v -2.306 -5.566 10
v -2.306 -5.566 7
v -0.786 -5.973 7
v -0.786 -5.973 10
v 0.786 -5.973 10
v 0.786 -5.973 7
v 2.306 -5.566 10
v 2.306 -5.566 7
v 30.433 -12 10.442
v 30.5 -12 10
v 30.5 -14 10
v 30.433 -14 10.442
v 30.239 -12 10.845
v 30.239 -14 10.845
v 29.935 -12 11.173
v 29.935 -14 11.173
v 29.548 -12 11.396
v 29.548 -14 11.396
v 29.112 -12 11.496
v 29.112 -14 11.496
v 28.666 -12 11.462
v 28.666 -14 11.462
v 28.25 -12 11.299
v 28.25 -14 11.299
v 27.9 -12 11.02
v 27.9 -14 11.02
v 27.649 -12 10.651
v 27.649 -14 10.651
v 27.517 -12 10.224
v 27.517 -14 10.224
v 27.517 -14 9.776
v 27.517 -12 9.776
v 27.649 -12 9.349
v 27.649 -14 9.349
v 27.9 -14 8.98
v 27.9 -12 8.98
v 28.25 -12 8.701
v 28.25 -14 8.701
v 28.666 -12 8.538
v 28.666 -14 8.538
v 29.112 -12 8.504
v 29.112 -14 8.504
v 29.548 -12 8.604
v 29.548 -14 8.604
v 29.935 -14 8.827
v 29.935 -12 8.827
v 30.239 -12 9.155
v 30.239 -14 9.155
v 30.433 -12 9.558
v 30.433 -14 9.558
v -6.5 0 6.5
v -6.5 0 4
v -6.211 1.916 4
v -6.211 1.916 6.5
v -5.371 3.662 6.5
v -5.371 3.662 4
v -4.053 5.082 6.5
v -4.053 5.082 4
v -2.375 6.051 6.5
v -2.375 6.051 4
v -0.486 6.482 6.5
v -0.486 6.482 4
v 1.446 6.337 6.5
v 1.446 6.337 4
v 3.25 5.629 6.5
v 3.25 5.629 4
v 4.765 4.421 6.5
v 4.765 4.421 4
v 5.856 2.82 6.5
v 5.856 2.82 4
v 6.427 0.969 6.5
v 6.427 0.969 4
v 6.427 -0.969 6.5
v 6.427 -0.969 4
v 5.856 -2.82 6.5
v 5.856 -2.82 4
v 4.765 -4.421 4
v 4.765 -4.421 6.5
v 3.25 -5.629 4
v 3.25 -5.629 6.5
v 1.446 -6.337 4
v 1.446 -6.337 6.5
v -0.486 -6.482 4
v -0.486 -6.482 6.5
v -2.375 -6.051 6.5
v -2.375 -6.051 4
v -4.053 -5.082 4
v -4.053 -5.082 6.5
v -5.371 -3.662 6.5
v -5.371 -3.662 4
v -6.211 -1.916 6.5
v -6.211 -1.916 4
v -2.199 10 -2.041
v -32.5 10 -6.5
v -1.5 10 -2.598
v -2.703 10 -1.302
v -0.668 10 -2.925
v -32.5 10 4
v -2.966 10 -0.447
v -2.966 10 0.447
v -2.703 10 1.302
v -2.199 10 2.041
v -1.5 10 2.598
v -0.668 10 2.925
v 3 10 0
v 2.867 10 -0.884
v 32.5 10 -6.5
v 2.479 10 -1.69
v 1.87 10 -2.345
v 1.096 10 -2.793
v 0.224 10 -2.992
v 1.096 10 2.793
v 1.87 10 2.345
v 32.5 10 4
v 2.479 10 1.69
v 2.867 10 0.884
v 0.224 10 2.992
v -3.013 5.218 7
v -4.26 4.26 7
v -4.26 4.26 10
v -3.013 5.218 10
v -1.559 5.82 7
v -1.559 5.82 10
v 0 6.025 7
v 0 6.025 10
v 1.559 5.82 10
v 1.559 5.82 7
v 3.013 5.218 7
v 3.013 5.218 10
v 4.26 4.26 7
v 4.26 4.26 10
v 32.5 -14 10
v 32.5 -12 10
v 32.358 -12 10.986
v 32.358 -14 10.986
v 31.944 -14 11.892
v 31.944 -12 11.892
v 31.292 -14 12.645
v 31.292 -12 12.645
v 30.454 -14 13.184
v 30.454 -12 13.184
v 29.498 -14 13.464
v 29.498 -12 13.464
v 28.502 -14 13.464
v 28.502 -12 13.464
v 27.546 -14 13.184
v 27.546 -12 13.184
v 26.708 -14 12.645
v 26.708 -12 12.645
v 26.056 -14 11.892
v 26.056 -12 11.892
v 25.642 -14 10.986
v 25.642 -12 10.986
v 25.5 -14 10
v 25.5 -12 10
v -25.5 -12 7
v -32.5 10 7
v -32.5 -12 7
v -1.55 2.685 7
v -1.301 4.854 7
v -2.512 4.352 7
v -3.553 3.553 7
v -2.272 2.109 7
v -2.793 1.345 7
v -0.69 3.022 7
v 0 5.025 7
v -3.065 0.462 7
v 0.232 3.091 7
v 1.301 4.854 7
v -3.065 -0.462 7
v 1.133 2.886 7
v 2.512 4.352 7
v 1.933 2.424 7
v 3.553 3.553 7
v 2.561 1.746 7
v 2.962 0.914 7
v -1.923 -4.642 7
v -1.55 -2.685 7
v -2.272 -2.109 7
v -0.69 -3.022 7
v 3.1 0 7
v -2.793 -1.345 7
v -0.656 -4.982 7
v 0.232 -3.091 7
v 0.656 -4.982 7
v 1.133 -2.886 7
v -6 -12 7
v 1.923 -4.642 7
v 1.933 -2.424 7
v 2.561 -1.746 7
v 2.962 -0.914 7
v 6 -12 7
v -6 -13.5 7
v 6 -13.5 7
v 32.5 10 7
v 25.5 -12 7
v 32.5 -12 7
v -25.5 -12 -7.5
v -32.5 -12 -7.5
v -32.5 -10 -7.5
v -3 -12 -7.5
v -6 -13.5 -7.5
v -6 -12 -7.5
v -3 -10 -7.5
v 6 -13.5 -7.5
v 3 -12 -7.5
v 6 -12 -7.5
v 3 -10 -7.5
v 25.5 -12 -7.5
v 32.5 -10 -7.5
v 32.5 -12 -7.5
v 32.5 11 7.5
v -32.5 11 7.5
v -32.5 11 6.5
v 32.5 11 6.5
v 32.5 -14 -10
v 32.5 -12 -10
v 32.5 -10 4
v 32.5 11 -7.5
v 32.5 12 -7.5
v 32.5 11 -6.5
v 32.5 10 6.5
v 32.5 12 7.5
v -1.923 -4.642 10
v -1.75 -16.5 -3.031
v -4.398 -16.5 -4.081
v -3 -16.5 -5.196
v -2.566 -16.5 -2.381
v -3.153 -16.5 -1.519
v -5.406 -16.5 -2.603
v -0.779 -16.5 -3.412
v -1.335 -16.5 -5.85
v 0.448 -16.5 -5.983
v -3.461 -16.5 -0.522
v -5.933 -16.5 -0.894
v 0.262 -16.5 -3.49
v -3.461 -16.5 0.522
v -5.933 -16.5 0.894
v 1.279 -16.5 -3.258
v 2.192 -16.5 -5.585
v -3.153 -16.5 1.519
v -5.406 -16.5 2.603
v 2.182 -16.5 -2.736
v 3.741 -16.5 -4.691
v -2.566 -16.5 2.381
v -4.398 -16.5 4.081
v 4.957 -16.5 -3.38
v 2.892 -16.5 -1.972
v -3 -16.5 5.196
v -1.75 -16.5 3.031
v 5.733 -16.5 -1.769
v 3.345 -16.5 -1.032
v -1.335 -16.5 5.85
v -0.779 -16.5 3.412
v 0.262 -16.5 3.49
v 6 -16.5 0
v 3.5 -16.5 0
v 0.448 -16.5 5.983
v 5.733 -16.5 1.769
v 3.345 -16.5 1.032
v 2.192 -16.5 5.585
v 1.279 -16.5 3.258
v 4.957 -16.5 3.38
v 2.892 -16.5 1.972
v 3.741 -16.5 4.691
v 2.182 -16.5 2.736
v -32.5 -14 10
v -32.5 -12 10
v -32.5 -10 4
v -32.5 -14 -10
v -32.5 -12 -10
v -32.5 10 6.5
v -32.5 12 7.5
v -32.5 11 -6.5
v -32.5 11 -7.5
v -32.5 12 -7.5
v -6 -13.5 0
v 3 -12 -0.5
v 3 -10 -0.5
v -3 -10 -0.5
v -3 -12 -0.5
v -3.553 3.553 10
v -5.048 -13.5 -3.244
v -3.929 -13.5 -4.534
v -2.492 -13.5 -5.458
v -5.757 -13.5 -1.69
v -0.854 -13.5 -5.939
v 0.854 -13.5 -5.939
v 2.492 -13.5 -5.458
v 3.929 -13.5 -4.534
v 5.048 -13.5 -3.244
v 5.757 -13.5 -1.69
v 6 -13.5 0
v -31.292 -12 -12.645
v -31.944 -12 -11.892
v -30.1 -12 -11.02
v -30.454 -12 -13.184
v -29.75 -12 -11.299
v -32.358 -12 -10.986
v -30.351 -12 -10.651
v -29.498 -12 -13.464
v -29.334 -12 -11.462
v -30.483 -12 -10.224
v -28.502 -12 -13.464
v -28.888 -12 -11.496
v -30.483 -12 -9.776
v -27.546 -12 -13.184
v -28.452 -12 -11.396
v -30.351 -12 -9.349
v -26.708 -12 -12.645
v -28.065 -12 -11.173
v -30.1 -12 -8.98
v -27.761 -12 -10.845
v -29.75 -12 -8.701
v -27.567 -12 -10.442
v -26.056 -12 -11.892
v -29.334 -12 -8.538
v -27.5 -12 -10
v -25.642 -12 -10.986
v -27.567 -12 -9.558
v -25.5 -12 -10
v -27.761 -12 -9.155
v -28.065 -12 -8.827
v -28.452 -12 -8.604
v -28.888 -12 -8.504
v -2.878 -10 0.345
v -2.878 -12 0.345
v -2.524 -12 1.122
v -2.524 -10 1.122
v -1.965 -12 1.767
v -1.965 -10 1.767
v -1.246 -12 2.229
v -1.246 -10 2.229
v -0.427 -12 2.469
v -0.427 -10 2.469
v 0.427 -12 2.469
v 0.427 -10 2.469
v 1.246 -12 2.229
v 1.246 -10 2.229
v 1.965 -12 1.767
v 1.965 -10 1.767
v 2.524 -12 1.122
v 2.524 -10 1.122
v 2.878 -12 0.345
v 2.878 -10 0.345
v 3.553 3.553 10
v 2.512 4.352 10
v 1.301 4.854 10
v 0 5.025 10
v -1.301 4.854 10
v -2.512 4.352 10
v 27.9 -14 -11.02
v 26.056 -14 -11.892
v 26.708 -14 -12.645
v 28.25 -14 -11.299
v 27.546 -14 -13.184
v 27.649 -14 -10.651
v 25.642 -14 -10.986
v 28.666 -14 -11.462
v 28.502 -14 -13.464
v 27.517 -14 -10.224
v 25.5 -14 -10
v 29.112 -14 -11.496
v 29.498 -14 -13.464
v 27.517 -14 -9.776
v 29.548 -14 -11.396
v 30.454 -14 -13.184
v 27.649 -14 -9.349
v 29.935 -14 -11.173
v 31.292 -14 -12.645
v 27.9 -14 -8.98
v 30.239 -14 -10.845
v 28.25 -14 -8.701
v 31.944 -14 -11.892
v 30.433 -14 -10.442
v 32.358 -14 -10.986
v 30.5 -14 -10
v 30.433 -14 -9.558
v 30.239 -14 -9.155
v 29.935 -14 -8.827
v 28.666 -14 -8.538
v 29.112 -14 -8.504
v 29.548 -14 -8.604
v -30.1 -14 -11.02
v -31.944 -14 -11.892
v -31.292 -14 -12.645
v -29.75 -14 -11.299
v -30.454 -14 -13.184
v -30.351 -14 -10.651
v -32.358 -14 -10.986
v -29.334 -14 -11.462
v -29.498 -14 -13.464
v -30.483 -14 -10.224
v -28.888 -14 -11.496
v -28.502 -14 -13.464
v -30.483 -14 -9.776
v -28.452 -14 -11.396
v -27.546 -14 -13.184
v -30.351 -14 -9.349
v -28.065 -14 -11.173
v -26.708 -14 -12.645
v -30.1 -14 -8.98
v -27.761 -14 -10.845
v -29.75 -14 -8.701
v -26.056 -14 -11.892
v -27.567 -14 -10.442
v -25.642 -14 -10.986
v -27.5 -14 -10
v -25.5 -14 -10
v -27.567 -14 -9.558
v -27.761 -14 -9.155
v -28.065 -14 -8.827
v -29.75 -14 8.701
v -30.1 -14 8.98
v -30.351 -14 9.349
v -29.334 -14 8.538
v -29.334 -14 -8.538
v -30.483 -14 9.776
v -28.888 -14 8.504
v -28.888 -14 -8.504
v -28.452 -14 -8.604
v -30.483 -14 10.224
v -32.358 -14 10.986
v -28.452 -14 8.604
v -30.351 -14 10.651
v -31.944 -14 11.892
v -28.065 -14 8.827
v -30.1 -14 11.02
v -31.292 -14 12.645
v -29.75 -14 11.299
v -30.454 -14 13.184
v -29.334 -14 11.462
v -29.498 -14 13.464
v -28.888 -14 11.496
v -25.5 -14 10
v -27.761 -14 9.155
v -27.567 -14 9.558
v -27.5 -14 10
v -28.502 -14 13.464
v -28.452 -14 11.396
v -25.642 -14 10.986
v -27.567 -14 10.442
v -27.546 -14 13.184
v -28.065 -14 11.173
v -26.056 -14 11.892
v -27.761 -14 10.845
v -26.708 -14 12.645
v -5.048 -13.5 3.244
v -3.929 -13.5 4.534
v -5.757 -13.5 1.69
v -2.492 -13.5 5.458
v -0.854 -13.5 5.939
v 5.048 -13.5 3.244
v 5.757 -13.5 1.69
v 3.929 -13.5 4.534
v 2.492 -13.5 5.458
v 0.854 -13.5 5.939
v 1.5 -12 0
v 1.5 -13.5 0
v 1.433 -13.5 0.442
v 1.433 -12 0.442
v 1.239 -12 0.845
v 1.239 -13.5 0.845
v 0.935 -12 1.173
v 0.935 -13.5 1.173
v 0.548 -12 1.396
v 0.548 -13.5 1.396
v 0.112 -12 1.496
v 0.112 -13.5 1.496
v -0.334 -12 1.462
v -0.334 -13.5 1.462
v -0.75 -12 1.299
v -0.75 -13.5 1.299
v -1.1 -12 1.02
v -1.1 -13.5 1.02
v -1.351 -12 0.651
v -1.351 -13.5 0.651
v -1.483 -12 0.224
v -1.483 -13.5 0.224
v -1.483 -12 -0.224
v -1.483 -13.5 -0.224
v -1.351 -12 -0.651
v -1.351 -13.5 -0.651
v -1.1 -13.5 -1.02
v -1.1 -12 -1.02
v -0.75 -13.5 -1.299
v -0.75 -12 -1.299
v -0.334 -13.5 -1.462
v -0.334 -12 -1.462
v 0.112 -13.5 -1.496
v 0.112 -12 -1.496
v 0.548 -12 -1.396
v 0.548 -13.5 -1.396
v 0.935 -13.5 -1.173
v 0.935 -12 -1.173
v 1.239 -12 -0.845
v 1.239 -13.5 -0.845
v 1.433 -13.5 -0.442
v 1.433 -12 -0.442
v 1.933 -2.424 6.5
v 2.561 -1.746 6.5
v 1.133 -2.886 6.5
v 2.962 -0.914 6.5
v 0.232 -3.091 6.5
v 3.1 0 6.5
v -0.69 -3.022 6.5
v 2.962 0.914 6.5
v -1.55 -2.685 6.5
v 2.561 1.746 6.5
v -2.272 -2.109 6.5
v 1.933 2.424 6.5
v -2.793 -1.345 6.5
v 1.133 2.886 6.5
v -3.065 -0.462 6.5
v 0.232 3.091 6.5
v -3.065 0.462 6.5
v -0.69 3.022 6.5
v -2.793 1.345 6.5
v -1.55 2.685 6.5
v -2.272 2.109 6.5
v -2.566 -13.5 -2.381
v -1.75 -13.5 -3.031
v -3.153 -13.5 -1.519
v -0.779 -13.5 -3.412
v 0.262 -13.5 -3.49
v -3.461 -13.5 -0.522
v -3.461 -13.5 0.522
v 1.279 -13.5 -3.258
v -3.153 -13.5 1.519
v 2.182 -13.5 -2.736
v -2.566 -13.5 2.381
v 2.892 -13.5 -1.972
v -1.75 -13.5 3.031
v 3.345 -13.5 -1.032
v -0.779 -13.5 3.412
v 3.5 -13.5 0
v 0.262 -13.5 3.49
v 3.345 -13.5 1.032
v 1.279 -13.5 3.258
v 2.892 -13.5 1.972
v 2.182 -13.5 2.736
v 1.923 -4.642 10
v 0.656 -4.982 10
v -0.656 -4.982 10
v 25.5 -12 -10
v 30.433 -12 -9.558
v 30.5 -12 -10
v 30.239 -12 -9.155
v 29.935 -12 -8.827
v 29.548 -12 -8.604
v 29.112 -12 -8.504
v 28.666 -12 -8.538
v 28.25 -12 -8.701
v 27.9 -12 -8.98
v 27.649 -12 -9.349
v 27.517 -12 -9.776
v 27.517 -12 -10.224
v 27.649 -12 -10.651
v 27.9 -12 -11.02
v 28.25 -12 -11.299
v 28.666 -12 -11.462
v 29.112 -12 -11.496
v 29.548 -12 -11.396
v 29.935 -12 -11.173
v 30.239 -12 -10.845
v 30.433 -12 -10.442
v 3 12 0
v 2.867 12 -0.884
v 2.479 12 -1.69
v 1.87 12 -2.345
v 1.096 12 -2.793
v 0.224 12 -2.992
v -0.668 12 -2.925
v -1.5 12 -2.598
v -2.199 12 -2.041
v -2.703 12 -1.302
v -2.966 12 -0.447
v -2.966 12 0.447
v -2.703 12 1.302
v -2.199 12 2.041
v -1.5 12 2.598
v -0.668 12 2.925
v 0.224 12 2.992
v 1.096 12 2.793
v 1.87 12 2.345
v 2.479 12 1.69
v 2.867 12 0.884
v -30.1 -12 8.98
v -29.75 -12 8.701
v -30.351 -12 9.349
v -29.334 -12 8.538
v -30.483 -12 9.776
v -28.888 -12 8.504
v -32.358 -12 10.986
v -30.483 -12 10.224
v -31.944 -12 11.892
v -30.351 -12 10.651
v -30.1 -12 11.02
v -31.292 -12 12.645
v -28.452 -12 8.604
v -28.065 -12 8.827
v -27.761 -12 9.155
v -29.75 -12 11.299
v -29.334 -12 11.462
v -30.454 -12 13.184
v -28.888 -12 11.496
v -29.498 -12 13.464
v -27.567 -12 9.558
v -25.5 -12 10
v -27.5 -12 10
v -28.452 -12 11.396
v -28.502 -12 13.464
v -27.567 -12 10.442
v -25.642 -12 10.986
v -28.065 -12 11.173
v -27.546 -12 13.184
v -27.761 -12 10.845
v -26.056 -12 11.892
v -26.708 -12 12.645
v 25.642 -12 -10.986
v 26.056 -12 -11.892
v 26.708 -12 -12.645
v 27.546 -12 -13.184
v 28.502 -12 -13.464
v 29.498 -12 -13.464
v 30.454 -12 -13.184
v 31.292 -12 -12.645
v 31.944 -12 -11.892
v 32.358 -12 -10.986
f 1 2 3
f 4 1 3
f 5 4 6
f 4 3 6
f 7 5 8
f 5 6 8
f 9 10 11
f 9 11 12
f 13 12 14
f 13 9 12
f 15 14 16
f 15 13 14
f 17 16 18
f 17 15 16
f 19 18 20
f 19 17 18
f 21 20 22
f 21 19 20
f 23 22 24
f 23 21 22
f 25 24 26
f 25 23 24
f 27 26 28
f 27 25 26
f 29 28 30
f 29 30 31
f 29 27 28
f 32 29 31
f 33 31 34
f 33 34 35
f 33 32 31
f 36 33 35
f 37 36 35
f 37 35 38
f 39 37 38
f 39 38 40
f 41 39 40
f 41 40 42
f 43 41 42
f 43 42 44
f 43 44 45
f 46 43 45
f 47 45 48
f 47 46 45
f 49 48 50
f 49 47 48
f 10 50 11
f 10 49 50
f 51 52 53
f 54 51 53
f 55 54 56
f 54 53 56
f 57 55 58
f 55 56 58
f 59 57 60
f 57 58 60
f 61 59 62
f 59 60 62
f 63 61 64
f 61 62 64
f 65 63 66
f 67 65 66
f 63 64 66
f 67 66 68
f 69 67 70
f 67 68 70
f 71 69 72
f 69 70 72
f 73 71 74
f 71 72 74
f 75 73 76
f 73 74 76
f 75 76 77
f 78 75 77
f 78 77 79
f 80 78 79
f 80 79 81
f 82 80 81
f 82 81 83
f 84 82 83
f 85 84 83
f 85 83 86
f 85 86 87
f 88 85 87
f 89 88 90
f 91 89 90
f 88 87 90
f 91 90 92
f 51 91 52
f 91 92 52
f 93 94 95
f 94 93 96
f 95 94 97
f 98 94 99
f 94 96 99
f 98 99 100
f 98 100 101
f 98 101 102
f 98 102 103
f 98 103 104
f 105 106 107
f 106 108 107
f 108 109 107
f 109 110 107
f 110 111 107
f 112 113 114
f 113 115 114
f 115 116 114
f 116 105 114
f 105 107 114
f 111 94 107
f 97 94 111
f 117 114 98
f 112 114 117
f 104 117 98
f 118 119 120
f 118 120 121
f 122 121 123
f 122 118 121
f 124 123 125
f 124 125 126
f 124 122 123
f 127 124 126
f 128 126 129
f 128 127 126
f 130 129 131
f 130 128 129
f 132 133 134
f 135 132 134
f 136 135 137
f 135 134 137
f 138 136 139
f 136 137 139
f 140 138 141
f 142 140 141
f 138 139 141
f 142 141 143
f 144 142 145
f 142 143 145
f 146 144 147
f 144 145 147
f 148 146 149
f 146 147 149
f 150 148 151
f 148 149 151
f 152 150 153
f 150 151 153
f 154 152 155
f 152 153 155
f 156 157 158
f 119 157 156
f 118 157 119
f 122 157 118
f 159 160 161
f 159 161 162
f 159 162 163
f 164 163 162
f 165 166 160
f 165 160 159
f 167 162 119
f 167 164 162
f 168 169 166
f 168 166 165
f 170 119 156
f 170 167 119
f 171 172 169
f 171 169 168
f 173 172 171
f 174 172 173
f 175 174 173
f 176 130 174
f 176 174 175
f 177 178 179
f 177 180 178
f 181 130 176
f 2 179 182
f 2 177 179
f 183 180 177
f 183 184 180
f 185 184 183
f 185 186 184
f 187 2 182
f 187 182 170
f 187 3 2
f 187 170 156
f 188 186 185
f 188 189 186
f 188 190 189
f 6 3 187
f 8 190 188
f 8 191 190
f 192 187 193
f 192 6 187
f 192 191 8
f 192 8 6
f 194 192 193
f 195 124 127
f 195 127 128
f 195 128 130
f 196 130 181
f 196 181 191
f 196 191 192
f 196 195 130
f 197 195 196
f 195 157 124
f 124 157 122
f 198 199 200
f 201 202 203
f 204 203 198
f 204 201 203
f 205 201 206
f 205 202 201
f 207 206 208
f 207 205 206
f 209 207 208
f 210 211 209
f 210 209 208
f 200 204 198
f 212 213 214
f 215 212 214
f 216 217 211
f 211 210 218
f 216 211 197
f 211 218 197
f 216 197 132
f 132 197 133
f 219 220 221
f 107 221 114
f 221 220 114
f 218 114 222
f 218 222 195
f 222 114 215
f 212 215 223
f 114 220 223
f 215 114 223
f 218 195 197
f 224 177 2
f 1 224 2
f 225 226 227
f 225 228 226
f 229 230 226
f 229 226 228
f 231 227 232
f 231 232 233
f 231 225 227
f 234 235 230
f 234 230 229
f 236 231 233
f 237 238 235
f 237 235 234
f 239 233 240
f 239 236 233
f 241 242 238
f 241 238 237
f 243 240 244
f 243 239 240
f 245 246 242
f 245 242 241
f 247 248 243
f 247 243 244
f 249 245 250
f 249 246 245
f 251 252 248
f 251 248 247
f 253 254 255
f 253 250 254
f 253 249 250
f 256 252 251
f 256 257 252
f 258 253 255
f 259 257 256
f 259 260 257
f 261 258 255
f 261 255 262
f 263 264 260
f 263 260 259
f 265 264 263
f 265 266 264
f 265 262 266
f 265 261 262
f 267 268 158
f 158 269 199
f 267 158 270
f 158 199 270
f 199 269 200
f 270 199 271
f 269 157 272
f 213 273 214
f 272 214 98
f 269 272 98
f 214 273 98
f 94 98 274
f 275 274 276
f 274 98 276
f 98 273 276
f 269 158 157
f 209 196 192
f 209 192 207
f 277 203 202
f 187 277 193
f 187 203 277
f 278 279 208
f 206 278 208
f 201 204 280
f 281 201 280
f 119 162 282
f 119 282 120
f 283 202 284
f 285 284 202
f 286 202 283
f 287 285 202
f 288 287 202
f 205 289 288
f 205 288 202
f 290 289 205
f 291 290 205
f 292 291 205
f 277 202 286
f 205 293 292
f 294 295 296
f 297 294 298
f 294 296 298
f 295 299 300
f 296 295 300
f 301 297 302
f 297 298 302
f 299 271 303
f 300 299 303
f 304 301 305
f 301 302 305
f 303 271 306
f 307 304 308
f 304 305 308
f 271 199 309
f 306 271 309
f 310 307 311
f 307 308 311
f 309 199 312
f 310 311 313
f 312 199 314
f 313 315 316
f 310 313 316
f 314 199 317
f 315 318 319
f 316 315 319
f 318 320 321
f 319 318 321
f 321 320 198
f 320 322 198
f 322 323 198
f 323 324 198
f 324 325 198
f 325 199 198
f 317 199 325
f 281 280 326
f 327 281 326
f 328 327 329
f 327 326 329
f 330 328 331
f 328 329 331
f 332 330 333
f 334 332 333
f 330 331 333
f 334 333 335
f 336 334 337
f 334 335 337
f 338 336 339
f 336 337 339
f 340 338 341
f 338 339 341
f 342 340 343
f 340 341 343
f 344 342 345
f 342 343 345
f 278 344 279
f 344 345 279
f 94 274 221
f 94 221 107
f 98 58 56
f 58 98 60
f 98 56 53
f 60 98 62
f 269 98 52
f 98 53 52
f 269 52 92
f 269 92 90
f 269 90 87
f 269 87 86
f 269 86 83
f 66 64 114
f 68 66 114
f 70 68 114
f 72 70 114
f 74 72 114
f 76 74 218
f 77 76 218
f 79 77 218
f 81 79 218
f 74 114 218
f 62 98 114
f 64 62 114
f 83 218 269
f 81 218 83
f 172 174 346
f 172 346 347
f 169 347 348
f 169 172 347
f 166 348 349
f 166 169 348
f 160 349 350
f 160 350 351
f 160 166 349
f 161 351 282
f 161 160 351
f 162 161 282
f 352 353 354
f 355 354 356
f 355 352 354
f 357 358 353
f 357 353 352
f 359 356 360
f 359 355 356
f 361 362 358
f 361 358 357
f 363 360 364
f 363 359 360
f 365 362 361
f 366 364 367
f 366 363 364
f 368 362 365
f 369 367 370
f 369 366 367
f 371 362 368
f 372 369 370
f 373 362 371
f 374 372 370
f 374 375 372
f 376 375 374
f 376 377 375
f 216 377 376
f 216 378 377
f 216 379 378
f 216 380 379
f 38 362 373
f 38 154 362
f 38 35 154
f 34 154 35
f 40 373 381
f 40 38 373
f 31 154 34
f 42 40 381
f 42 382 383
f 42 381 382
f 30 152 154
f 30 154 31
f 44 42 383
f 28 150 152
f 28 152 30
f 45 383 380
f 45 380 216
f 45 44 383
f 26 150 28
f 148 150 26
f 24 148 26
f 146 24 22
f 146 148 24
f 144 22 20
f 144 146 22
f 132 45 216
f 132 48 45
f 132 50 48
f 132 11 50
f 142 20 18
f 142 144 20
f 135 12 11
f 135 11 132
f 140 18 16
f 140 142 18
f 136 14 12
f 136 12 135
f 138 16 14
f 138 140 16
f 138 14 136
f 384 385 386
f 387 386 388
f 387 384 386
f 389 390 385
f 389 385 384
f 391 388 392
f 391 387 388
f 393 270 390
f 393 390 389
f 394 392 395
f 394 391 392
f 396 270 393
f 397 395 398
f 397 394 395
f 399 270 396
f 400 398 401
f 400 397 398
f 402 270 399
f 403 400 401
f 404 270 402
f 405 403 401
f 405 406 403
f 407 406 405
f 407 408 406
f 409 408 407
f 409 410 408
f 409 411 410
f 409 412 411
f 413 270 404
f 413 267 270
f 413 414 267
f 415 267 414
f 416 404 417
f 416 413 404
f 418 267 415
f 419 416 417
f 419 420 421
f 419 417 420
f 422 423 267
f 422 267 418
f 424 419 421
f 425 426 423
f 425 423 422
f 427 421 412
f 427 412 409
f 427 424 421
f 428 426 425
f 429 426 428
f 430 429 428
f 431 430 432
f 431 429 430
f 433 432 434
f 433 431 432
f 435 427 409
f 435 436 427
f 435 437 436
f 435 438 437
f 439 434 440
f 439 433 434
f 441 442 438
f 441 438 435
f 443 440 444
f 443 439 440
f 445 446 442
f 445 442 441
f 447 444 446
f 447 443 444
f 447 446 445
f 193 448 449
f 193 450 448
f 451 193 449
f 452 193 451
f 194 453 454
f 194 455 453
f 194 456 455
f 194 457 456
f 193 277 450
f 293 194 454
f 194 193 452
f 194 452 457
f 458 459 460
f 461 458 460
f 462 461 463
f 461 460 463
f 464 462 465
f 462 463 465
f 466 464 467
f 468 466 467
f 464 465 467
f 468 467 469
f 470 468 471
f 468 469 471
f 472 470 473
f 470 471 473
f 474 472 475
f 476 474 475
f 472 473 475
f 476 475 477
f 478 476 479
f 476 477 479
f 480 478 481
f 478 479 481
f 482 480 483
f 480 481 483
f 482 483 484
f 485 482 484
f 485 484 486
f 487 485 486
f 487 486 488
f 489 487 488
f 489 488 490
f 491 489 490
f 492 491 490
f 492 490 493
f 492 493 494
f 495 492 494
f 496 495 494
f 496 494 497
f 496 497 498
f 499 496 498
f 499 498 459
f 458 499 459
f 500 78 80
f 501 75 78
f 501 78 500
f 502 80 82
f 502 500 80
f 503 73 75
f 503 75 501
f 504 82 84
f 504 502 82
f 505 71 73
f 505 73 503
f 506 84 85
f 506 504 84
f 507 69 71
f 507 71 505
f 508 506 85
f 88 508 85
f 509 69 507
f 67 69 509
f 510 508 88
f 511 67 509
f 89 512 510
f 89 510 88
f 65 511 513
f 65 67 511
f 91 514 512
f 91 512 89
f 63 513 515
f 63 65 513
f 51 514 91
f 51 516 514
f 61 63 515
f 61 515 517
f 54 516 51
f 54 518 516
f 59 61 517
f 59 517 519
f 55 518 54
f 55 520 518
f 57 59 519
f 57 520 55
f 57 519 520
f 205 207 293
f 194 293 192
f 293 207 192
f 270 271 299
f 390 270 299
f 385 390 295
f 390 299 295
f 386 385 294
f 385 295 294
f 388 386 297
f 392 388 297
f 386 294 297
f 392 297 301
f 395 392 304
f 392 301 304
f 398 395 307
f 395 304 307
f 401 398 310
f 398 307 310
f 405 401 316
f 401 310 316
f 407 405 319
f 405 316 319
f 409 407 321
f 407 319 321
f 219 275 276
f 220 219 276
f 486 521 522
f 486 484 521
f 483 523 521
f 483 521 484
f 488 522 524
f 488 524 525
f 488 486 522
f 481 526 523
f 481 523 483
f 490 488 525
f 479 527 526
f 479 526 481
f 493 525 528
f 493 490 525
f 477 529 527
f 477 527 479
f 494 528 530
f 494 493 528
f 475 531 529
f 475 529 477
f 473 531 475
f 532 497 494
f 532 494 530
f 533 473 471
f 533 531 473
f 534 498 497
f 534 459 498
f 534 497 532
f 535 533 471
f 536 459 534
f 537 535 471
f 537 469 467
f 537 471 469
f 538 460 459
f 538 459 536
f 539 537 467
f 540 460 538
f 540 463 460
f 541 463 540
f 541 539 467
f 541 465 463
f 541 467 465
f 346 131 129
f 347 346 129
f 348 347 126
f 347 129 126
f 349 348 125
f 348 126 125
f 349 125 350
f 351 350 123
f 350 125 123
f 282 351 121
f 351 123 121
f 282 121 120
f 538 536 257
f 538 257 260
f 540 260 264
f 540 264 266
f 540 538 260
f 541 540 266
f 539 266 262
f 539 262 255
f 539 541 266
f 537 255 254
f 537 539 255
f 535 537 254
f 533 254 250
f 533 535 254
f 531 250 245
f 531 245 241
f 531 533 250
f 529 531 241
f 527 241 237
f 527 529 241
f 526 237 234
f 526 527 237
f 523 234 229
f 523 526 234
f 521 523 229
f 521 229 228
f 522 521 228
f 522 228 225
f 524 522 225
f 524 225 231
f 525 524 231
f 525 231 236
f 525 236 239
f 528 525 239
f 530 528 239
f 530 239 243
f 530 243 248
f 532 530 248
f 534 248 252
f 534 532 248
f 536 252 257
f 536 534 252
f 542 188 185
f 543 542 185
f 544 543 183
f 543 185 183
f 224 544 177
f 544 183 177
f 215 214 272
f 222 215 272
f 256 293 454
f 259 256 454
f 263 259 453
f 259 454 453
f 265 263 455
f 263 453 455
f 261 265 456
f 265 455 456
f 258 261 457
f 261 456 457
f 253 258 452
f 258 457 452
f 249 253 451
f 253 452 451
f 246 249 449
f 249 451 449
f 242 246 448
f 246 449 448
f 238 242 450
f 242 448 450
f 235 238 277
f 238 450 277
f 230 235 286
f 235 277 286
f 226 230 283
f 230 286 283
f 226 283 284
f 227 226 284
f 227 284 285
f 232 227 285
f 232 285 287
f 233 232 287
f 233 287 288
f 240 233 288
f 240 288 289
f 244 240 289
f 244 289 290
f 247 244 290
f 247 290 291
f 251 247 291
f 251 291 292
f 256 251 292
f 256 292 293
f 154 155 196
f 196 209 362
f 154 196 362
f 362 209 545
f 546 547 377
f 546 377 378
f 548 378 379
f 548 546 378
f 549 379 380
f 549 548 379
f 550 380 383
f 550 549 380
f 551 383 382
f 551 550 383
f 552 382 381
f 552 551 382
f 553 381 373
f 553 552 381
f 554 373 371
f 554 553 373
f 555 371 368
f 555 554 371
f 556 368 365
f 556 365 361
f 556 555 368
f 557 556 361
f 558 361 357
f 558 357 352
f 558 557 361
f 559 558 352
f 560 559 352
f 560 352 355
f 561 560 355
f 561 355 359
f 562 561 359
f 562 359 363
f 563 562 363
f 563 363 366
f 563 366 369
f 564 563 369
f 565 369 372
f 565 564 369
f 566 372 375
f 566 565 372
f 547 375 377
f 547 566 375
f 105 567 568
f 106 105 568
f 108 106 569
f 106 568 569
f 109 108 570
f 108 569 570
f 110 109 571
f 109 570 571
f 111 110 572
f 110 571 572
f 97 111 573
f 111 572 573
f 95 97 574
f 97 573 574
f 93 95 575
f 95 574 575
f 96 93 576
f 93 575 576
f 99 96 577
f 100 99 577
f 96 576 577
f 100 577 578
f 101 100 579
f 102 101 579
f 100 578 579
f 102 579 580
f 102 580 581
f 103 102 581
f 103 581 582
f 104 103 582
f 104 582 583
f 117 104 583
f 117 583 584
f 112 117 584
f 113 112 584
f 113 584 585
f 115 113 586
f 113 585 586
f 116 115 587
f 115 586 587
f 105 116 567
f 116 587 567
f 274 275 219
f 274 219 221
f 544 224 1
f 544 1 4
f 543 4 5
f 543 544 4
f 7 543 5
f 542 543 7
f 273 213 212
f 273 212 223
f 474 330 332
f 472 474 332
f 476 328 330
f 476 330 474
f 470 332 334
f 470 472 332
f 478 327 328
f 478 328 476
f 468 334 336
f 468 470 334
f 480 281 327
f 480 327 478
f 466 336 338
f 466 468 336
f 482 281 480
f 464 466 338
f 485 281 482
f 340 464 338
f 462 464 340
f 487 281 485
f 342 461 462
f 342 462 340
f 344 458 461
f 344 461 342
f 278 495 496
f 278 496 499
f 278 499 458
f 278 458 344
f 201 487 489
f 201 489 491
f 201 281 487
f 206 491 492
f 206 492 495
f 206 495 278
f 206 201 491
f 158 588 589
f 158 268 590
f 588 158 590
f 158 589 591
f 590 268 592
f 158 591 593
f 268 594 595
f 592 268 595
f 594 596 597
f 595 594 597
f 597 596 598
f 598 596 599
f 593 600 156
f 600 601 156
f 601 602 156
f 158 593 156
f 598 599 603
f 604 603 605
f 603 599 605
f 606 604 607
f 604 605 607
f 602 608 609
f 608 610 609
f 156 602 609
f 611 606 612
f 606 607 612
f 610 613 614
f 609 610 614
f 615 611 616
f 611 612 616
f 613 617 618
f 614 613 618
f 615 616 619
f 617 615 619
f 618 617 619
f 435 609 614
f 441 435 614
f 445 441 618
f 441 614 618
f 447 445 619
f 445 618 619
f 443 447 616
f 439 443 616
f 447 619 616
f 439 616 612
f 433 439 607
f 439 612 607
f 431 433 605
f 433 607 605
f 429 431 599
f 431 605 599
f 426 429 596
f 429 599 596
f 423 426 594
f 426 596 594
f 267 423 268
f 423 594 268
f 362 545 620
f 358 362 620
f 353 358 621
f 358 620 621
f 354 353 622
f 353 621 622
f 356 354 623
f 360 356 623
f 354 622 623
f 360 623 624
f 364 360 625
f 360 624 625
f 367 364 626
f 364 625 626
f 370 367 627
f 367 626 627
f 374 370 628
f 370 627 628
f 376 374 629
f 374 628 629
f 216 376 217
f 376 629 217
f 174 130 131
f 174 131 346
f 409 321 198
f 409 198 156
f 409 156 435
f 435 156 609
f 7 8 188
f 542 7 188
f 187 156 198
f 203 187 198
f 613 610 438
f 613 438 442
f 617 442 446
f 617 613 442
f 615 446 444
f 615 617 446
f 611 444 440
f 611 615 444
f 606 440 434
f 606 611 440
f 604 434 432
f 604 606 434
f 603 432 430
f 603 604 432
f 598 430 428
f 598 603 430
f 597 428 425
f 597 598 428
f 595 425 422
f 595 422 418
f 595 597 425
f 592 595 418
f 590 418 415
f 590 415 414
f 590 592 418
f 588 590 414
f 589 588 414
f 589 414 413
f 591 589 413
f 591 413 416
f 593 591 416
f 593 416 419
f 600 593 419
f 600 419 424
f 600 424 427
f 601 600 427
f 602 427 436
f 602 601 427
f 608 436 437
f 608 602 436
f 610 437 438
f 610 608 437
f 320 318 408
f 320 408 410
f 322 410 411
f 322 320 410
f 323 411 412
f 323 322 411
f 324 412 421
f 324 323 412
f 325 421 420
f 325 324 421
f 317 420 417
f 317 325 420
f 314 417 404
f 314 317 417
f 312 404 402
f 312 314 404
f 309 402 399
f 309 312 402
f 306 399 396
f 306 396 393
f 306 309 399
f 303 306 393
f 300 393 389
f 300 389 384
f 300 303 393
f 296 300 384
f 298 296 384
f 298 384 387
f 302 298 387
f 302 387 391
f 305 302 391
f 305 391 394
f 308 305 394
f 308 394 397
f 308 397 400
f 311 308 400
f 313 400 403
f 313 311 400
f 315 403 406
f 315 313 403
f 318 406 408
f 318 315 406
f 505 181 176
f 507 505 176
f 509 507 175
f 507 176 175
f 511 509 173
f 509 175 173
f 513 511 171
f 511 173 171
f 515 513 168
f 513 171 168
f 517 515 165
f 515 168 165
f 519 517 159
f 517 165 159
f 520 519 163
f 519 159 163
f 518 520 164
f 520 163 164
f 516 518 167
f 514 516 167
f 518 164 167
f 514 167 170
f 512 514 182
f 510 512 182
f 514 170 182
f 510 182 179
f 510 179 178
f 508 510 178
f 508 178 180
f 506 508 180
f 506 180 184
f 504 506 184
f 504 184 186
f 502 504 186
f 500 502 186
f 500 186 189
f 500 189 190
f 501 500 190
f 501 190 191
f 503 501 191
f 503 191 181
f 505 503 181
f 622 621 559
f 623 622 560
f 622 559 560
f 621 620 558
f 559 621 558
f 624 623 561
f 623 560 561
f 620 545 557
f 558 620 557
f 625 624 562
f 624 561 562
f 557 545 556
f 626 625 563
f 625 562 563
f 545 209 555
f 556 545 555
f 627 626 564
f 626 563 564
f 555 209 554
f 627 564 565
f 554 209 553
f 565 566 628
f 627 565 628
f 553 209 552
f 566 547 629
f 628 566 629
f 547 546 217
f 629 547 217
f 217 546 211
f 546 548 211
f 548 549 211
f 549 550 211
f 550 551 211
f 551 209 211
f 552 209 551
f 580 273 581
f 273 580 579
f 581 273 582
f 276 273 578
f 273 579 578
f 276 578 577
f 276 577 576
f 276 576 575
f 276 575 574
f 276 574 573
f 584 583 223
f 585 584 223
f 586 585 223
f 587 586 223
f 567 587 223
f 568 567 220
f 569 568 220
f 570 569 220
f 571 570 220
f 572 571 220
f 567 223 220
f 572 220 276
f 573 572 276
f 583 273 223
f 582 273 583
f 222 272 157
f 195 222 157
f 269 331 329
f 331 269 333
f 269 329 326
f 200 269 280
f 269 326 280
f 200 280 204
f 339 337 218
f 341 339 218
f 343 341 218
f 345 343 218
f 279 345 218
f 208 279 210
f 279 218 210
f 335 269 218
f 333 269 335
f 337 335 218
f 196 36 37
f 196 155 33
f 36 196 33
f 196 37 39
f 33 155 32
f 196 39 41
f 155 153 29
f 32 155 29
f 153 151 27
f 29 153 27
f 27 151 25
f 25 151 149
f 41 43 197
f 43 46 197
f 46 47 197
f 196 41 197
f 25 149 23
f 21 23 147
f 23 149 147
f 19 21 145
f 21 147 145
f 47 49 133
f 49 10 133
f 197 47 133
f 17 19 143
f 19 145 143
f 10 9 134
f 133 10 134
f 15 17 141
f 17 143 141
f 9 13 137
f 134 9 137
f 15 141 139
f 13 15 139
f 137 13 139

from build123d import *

# Parameters (mm, degrees)
SALIENTE_EXTRUIR1_DEPTH      = 32.5
SALIENTE_EXTRUIR1_DEPTH_BACK = 32.5
CROQUIS1_W                   = 15
CROQUIS1_H                   = 24
CORTAR_EXTRUIR1_DEPTH        = 65.5
CORTAR_EXTRUIR2_DEPTH        = 65.5
SALIENTE_EXTRUIR2_DEPTH      = 3
CROQUIS5_R                   = 3.1
CORTAR_EXTRUIR3_DEPTH        = 3
CROQUIS6_R                   = 6.5
CORTAR_EXTRUIR5_DEPTH        = 2.5
CROQUIS7_W                   = 12
CROQUIS7_H                   = 14.5
SALIENTE_EXTRUIR3_DEPTH      = 1.5
CROQUIS8_R                   = 6
CROQUIS8_R_2                 = 3.5
SALIENTE_EXTRUIR4_DEPTH      = 3
CORTAR_EXTRUIR6_DEPTH        = 2
CROQUIS10_R                  = 1.5
CORTAR_EXTRUIR7_DEPTH        = 2
CROQUIS11_R                  = 3
CORTAR_EXTRUIR8_DEPTH        = 2
CROQUIS12_R                  = 1.5
SALIENTE_EXTRUIR5_DEPTH      = 2


with BuildPart() as part:
    # Croquis1 → Saliente-Extruir1 (new, two sides: drawn at the far end of the back side and taken through both)
    with BuildSketch(Plane(origin=(0, 0, 0), x_dir=(0, 0, -1), z_dir=(1, 0, 0)).offset(-SALIENTE_EXTRUIR1_DEPTH_BACK)):
        Rectangle(CROQUIS1_W, CROQUIS1_H)
    extrude(amount=SALIENTE_EXTRUIR1_DEPTH + SALIENTE_EXTRUIR1_DEPTH_BACK)

    # Croquis2 → Cortar-Extruir1 (cut)
    with BuildSketch(Plane(origin=(32.5, 0, 0), x_dir=(0, 0, -1), z_dir=(1, 0, 0))):
        Polygon((-7.5, 11), (-6.5, 11), (-6.5, 10), (-7, 10), (-7, -12), (-7.5, -12), align=None)
    extrude(amount=-CORTAR_EXTRUIR1_DEPTH, mode=Mode.SUBTRACT)

    # Croquis3 → Cortar-Extruir2 (cut)
    with BuildSketch(Plane(origin=(32.5, 0, 0), x_dir=(0, 0, -1), z_dir=(1, 0, 0))):
        Polygon((7.5, 11), (6.5, 11), (6.5, 10), (-4, 10), (-4, -10), (7.5, -10), align=None)
    extrude(amount=-CORTAR_EXTRUIR2_DEPTH, mode=Mode.SUBTRACT)

    # Croquis4 → Saliente-Extruir2 (add)
    with BuildSketch(Plane.XY.offset(7)):
        with BuildLine():
            Line((-3.553211575, 3.553211575), (-4.260318357, 4.260318357))
            ThreePointArc((-4.260318357, 4.260318357), (0, 6.025), (4.260318357, 4.260318357))
            Line((4.260318357, 4.260318357), (3.553211575, 3.553211575))
            ThreePointArc((3.553211575, 3.553211575), (0, 5.025), (-3.553211575, 3.553211575))
        make_face()
        with BuildLine():
            Line((-1.922984248, -4.642494651), (-2.30566768, -5.566374183))
            ThreePointArc((-2.30566768, -5.566374183), (0, -6.025), (2.30566768, -5.566374183))
            Line((2.30566768, -5.566374183), (1.922984248, -4.642494651))
            ThreePointArc((1.922984248, -4.642494651), (0, -5.025), (-1.922984248, -4.642494651))
        make_face()
    extrude(amount=SALIENTE_EXTRUIR2_DEPTH)

    # Croquis5 → Cortar-Extruir3 (cut)
    with BuildSketch(Plane.XY.offset(7)):
        Circle(CROQUIS5_R)
    extrude(amount=-CORTAR_EXTRUIR3_DEPTH, mode=Mode.SUBTRACT)

    # Croquis6 → Cortar-Extruir5 (cut)
    with BuildSketch(Plane(origin=(0, 0, 4), x_dir=(-1, 0, 0), z_dir=(0, 0, -1))):
        Circle(CROQUIS6_R)
    extrude(amount=-CORTAR_EXTRUIR5_DEPTH, mode=Mode.SUBTRACT)

    # Croquis7 → Saliente-Extruir3 (add)
    with BuildSketch(Plane.XZ.offset(12)):
        with Locations((0, -0.25)):
            Rectangle(CROQUIS7_W, CROQUIS7_H)
    extrude(amount=SALIENTE_EXTRUIR3_DEPTH)

    # Croquis8 → Saliente-Extruir4 (add)
    with BuildSketch(Plane.XZ.offset(13.5)):
        Circle(CROQUIS8_R)
        Circle(CROQUIS8_R_2, mode=Mode.SUBTRACT)
    extrude(amount=SALIENTE_EXTRUIR4_DEPTH)

    # Croquis9 → Cortar-Extruir6 (cut)
    with BuildSketch(Plane(origin=(0, -10, 0), x_dir=(1, 0, 0), z_dir=(0, 1, 0))):
        with BuildLine():
            Line((3, 7.5), (-3, 7.5))
            Line((-3, 7.5), (-3, 0.5))
            ThreePointArc((-3, 0.5), (0, -2.5), (3, 0.5))
            Line((3, 0.5), (3, 7.5))
        make_face()
    extrude(amount=-CORTAR_EXTRUIR6_DEPTH, mode=Mode.SUBTRACT)

    # Croquis10 → Cortar-Extruir7 (cut)
    with BuildSketch(Plane.XZ.offset(13.5)):
        Circle(CROQUIS10_R)
    extrude(amount=-CORTAR_EXTRUIR7_DEPTH, mode=Mode.SUBTRACT)

    # Croquis11 → Cortar-Extruir8 (cut)
    with BuildSketch(Plane(origin=(0, 12, 0), x_dir=(1, 0, 0), z_dir=(0, 1, 0))):
        Circle(CROQUIS11_R)
    extrude(amount=-CORTAR_EXTRUIR8_DEPTH, mode=Mode.SUBTRACT)

    # Croquis12 → Saliente-Extruir5 (add)
    # profile 1 of 2: a face of its own
    with BuildSketch(Plane.XZ.offset(12)):
        with BuildLine():
            Line((32.5, -10), (32.5, 10))
            ThreePointArc((32.5, 10), (29, 13.5), (25.5, 10))
            Line((25.5, 10), (25.5, -10))
            ThreePointArc((25.5, -10), (29, -13.5), (32.5, -10))
        make_face()
        with Locations((29, 10)):
            Circle(CROQUIS12_R, mode=Mode.SUBTRACT)
        with Locations((29, -10)):
            Circle(CROQUIS12_R, mode=Mode.SUBTRACT)
    # profile 2 of 2: a face of its own
    with BuildSketch(Plane.XZ.offset(12)):
        with BuildLine():
            Line((-25.5, -10), (-25.5, 10))
            ThreePointArc((-25.5, 10), (-29, 13.5), (-32.5, 10))
            Line((-32.5, 10), (-32.5, -10))
            ThreePointArc((-32.5, -10), (-29, -13.5), (-25.5, -10))
        make_face()
        with Locations((-29, 10)):
            Circle(CROQUIS12_R, mode=Mode.SUBTRACT)
        with Locations((-29, -10)):
            Circle(CROQUIS12_R, mode=Mode.SUBTRACT)
    extrude(amount=SALIENTE_EXTRUIR5_DEPTH)


solid = part.part
